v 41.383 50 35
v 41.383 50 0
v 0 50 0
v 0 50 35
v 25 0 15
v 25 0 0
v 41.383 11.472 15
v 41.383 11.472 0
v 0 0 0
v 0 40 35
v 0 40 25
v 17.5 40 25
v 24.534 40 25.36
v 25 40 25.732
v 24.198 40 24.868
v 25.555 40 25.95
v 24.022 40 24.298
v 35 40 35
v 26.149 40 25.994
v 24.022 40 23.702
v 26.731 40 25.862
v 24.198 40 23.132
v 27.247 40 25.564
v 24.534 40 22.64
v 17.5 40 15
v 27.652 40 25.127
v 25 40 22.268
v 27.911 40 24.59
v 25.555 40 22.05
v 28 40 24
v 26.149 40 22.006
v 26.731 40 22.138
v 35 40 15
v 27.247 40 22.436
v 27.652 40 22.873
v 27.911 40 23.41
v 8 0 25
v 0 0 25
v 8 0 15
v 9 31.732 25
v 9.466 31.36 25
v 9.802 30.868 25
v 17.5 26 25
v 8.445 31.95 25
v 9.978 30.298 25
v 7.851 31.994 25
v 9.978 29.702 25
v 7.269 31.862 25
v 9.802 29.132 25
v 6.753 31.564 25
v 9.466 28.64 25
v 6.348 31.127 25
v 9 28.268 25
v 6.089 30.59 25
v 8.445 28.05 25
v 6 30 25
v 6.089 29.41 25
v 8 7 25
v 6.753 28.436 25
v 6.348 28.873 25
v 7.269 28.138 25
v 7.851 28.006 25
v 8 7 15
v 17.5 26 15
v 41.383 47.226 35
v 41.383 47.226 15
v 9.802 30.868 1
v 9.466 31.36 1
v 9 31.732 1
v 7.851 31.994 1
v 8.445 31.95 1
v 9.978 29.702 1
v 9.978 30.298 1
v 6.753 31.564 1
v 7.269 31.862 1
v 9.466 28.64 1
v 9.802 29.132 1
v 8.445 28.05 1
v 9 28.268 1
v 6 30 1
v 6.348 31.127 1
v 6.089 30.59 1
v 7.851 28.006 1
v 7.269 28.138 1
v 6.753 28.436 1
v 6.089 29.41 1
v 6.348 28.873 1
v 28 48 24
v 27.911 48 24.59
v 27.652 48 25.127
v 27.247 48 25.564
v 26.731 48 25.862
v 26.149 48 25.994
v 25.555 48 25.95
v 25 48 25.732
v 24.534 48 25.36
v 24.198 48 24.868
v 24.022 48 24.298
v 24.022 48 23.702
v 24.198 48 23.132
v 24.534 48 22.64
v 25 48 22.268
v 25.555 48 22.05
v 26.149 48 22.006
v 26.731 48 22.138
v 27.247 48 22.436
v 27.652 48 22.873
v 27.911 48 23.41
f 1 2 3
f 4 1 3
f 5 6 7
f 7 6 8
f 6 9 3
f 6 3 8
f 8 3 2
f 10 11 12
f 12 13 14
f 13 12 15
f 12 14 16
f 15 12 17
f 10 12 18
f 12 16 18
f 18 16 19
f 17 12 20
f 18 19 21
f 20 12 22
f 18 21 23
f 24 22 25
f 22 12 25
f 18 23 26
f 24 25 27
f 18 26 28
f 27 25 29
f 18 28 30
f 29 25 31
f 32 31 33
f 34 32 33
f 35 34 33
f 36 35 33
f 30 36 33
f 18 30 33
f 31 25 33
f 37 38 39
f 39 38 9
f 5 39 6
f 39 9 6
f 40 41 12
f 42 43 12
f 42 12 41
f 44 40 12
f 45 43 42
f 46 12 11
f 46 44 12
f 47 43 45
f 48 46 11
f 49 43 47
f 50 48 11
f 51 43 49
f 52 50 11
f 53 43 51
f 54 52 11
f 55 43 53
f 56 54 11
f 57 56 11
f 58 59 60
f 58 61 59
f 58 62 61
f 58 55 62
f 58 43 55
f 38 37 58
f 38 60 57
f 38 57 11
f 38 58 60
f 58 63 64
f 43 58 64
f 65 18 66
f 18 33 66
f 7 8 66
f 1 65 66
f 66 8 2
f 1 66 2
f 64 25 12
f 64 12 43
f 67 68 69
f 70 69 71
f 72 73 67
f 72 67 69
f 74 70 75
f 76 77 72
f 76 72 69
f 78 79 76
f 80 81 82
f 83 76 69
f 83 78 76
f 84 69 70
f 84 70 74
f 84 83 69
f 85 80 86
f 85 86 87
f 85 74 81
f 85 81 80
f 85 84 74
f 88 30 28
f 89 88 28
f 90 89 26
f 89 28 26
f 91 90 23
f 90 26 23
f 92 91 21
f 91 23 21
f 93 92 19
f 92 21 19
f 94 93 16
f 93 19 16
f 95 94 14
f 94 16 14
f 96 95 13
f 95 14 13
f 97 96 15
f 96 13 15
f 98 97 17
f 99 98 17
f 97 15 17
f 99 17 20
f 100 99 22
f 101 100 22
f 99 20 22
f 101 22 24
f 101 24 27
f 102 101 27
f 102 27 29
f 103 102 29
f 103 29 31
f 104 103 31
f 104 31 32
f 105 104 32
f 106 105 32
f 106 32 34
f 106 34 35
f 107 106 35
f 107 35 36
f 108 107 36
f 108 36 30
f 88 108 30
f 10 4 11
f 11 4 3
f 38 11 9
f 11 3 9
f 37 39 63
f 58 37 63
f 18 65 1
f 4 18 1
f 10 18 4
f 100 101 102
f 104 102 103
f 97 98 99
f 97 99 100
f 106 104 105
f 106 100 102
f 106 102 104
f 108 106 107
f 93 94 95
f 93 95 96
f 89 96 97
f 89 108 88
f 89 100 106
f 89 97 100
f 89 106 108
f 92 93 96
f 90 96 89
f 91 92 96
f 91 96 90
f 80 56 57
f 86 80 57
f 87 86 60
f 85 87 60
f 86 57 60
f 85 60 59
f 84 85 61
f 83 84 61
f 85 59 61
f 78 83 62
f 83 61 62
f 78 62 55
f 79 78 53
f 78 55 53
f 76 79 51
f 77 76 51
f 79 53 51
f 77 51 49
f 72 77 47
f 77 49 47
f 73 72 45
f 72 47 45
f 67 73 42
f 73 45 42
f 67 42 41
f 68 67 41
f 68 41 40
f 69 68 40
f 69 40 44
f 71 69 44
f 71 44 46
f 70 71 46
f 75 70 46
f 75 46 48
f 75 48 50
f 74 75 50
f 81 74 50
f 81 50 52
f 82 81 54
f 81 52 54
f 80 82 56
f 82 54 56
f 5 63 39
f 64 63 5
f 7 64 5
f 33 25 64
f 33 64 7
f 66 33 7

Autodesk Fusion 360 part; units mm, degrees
sketch "Sketch1" plane through (0, 0, 0) normal (0, 0, 1) x (1, 0, 0)
  line L0 (0, 0) -> (0, 50)
  line L1 (0, 0) -> (25, 0)
  line L2 (25, 0) -> (41.383, 11.4715)
  line L3 (25, 0) -> (45, 0) construction
  line L4 (0, 50) -> (41.383, 50)
  line L5 (41.383, 50) -> (41.383, 11.4715)
  dimension "d1" = 50
  dimension "d2" = 25
  dimension "d3" = 35
  dimension "d4" = 20
extrude "Extrude1" add sketch "Sketch1" along normal blind 40
extrude "Extrude2" cut 1 faces at (27.5887, 37.1572, 40) along direction (0, 0, -1) blind 25
sketch "Sketch2" plane through (0, 0, 15) normal (0, 0, 1) x (-1, 0, 0)
  line L0 (0, 0) -> (-25, 0)
  line L1 (-25, 0) -> (-41.383, -11.4715)
  line L2 (-41.383, -11.4715) -> (-41.383, -50)
  line L3 (-41.383, -50) -> (0, -50)
  line L4 (0, -50) -> (0, 0)
  line L5 (0, -40) -> (-30, -40)
  line L6 (0, 0) -> (-8, 0)
  line L7 (-8, -15) -> (-8, 0)
  line L8 (-15, -40) -> (-15, -30)
  line L9 (-8, -15) -> (-15, -30)
  line L10 (-30, -40) -> (-35, -40)
  line L11 (-35, -40) -> (-41.383, -47.2262)
extrude "Extrude3" add sketch "Sketch2" along normal blind 20 contours L2 L3 L4 L5 L10 L11
sketch "Sketch3" plane through (0, 0, 15) normal (0, 0, 1) x (-1, 0, 0)
  line L0 (-41.383, -47.2262) -> (-35, -40)
  line L1 (-35, -40) -> (0, -40)
  line L2 (0, -40) -> (0, 0)
  line L3 (0, 0) -> (-25, 0)
  line L4 (-25, 0) -> (-41.383, -11.4715)
  line L5 (-41.383, -11.4715) -> (-41.383, -47.2262)
  line L6 (-17.5, -40) -> (-17.5, -30)
  line L7 (-8, 0) -> (-8, -7)
  line L8 (-17.5, -30) -> (-17.5, -26)
  line L9 (-8, -7) -> (-17.5, -26)
extrude "Extrude4" add sketch "Sketch3" along normal blind 10 contours L1 L2 L3 L6 L7 L8 L9
sketch "Sketch4" plane through (0, 0, 25) normal (0, 0, 1) x (-1, 0, 0)
  line L0 (-17.5, -40) -> (0, -40)
  line L1 (0, -40) -> (0, 0)
  line L2 (0, 0) -> (-8, 0)
  line L3 (-8, 0) -> (-8, -7)
  line L4 (-8, -7) -> (-17.5, -26)
  line L5 (-17.5, -26) -> (-17.5, -40)
  circle A0 centre (-8, -30) radius 2
extrude "Extrude5" cut sketch "Sketch4" against normal blind 24 contours A0
sketch "Sketch5" plane through (0, 40, 0) normal (0, -1, 0) x (1, 0, 0)
  line L0 (17.5, 25) -> (17.5, 15)
  line L1 (17.5, 15) -> (35, 15)
  line L2 (35, 15) -> (35, 35)
  line L3 (35, 35) -> (0, 35)
  line L4 (0, 35) -> (0, 25)
  line L5 (0, 25) -> (17.5, 25)
sketch "Sketch6" plane through (0, 0, 25) normal (0, 0, 1) x (-1, 0, 0)
  circle A0 centre (-8, -30) radius 2
  line L0 (-17.5, -40) -> (0, -40)
  line L1 (0, -40) -> (0, 0)
  line L2 (0, 0) -> (-8, 0)
  line L3 (-8, 0) -> (-8, -7)
  line L4 (-8, -7) -> (-17.5, -26)
  line L5 (-17.5, -26) -> (-17.5, -40)
sketch "Sketch7" plane through (0, 40, 0) normal (0, -1, 0) x (1, 0, 0)
  circle A0 centre (26, 24) radius 2
  dimension "d17" = 4
extrude "Extrude6" cut sketch "Sketch7" against normal blind 8
